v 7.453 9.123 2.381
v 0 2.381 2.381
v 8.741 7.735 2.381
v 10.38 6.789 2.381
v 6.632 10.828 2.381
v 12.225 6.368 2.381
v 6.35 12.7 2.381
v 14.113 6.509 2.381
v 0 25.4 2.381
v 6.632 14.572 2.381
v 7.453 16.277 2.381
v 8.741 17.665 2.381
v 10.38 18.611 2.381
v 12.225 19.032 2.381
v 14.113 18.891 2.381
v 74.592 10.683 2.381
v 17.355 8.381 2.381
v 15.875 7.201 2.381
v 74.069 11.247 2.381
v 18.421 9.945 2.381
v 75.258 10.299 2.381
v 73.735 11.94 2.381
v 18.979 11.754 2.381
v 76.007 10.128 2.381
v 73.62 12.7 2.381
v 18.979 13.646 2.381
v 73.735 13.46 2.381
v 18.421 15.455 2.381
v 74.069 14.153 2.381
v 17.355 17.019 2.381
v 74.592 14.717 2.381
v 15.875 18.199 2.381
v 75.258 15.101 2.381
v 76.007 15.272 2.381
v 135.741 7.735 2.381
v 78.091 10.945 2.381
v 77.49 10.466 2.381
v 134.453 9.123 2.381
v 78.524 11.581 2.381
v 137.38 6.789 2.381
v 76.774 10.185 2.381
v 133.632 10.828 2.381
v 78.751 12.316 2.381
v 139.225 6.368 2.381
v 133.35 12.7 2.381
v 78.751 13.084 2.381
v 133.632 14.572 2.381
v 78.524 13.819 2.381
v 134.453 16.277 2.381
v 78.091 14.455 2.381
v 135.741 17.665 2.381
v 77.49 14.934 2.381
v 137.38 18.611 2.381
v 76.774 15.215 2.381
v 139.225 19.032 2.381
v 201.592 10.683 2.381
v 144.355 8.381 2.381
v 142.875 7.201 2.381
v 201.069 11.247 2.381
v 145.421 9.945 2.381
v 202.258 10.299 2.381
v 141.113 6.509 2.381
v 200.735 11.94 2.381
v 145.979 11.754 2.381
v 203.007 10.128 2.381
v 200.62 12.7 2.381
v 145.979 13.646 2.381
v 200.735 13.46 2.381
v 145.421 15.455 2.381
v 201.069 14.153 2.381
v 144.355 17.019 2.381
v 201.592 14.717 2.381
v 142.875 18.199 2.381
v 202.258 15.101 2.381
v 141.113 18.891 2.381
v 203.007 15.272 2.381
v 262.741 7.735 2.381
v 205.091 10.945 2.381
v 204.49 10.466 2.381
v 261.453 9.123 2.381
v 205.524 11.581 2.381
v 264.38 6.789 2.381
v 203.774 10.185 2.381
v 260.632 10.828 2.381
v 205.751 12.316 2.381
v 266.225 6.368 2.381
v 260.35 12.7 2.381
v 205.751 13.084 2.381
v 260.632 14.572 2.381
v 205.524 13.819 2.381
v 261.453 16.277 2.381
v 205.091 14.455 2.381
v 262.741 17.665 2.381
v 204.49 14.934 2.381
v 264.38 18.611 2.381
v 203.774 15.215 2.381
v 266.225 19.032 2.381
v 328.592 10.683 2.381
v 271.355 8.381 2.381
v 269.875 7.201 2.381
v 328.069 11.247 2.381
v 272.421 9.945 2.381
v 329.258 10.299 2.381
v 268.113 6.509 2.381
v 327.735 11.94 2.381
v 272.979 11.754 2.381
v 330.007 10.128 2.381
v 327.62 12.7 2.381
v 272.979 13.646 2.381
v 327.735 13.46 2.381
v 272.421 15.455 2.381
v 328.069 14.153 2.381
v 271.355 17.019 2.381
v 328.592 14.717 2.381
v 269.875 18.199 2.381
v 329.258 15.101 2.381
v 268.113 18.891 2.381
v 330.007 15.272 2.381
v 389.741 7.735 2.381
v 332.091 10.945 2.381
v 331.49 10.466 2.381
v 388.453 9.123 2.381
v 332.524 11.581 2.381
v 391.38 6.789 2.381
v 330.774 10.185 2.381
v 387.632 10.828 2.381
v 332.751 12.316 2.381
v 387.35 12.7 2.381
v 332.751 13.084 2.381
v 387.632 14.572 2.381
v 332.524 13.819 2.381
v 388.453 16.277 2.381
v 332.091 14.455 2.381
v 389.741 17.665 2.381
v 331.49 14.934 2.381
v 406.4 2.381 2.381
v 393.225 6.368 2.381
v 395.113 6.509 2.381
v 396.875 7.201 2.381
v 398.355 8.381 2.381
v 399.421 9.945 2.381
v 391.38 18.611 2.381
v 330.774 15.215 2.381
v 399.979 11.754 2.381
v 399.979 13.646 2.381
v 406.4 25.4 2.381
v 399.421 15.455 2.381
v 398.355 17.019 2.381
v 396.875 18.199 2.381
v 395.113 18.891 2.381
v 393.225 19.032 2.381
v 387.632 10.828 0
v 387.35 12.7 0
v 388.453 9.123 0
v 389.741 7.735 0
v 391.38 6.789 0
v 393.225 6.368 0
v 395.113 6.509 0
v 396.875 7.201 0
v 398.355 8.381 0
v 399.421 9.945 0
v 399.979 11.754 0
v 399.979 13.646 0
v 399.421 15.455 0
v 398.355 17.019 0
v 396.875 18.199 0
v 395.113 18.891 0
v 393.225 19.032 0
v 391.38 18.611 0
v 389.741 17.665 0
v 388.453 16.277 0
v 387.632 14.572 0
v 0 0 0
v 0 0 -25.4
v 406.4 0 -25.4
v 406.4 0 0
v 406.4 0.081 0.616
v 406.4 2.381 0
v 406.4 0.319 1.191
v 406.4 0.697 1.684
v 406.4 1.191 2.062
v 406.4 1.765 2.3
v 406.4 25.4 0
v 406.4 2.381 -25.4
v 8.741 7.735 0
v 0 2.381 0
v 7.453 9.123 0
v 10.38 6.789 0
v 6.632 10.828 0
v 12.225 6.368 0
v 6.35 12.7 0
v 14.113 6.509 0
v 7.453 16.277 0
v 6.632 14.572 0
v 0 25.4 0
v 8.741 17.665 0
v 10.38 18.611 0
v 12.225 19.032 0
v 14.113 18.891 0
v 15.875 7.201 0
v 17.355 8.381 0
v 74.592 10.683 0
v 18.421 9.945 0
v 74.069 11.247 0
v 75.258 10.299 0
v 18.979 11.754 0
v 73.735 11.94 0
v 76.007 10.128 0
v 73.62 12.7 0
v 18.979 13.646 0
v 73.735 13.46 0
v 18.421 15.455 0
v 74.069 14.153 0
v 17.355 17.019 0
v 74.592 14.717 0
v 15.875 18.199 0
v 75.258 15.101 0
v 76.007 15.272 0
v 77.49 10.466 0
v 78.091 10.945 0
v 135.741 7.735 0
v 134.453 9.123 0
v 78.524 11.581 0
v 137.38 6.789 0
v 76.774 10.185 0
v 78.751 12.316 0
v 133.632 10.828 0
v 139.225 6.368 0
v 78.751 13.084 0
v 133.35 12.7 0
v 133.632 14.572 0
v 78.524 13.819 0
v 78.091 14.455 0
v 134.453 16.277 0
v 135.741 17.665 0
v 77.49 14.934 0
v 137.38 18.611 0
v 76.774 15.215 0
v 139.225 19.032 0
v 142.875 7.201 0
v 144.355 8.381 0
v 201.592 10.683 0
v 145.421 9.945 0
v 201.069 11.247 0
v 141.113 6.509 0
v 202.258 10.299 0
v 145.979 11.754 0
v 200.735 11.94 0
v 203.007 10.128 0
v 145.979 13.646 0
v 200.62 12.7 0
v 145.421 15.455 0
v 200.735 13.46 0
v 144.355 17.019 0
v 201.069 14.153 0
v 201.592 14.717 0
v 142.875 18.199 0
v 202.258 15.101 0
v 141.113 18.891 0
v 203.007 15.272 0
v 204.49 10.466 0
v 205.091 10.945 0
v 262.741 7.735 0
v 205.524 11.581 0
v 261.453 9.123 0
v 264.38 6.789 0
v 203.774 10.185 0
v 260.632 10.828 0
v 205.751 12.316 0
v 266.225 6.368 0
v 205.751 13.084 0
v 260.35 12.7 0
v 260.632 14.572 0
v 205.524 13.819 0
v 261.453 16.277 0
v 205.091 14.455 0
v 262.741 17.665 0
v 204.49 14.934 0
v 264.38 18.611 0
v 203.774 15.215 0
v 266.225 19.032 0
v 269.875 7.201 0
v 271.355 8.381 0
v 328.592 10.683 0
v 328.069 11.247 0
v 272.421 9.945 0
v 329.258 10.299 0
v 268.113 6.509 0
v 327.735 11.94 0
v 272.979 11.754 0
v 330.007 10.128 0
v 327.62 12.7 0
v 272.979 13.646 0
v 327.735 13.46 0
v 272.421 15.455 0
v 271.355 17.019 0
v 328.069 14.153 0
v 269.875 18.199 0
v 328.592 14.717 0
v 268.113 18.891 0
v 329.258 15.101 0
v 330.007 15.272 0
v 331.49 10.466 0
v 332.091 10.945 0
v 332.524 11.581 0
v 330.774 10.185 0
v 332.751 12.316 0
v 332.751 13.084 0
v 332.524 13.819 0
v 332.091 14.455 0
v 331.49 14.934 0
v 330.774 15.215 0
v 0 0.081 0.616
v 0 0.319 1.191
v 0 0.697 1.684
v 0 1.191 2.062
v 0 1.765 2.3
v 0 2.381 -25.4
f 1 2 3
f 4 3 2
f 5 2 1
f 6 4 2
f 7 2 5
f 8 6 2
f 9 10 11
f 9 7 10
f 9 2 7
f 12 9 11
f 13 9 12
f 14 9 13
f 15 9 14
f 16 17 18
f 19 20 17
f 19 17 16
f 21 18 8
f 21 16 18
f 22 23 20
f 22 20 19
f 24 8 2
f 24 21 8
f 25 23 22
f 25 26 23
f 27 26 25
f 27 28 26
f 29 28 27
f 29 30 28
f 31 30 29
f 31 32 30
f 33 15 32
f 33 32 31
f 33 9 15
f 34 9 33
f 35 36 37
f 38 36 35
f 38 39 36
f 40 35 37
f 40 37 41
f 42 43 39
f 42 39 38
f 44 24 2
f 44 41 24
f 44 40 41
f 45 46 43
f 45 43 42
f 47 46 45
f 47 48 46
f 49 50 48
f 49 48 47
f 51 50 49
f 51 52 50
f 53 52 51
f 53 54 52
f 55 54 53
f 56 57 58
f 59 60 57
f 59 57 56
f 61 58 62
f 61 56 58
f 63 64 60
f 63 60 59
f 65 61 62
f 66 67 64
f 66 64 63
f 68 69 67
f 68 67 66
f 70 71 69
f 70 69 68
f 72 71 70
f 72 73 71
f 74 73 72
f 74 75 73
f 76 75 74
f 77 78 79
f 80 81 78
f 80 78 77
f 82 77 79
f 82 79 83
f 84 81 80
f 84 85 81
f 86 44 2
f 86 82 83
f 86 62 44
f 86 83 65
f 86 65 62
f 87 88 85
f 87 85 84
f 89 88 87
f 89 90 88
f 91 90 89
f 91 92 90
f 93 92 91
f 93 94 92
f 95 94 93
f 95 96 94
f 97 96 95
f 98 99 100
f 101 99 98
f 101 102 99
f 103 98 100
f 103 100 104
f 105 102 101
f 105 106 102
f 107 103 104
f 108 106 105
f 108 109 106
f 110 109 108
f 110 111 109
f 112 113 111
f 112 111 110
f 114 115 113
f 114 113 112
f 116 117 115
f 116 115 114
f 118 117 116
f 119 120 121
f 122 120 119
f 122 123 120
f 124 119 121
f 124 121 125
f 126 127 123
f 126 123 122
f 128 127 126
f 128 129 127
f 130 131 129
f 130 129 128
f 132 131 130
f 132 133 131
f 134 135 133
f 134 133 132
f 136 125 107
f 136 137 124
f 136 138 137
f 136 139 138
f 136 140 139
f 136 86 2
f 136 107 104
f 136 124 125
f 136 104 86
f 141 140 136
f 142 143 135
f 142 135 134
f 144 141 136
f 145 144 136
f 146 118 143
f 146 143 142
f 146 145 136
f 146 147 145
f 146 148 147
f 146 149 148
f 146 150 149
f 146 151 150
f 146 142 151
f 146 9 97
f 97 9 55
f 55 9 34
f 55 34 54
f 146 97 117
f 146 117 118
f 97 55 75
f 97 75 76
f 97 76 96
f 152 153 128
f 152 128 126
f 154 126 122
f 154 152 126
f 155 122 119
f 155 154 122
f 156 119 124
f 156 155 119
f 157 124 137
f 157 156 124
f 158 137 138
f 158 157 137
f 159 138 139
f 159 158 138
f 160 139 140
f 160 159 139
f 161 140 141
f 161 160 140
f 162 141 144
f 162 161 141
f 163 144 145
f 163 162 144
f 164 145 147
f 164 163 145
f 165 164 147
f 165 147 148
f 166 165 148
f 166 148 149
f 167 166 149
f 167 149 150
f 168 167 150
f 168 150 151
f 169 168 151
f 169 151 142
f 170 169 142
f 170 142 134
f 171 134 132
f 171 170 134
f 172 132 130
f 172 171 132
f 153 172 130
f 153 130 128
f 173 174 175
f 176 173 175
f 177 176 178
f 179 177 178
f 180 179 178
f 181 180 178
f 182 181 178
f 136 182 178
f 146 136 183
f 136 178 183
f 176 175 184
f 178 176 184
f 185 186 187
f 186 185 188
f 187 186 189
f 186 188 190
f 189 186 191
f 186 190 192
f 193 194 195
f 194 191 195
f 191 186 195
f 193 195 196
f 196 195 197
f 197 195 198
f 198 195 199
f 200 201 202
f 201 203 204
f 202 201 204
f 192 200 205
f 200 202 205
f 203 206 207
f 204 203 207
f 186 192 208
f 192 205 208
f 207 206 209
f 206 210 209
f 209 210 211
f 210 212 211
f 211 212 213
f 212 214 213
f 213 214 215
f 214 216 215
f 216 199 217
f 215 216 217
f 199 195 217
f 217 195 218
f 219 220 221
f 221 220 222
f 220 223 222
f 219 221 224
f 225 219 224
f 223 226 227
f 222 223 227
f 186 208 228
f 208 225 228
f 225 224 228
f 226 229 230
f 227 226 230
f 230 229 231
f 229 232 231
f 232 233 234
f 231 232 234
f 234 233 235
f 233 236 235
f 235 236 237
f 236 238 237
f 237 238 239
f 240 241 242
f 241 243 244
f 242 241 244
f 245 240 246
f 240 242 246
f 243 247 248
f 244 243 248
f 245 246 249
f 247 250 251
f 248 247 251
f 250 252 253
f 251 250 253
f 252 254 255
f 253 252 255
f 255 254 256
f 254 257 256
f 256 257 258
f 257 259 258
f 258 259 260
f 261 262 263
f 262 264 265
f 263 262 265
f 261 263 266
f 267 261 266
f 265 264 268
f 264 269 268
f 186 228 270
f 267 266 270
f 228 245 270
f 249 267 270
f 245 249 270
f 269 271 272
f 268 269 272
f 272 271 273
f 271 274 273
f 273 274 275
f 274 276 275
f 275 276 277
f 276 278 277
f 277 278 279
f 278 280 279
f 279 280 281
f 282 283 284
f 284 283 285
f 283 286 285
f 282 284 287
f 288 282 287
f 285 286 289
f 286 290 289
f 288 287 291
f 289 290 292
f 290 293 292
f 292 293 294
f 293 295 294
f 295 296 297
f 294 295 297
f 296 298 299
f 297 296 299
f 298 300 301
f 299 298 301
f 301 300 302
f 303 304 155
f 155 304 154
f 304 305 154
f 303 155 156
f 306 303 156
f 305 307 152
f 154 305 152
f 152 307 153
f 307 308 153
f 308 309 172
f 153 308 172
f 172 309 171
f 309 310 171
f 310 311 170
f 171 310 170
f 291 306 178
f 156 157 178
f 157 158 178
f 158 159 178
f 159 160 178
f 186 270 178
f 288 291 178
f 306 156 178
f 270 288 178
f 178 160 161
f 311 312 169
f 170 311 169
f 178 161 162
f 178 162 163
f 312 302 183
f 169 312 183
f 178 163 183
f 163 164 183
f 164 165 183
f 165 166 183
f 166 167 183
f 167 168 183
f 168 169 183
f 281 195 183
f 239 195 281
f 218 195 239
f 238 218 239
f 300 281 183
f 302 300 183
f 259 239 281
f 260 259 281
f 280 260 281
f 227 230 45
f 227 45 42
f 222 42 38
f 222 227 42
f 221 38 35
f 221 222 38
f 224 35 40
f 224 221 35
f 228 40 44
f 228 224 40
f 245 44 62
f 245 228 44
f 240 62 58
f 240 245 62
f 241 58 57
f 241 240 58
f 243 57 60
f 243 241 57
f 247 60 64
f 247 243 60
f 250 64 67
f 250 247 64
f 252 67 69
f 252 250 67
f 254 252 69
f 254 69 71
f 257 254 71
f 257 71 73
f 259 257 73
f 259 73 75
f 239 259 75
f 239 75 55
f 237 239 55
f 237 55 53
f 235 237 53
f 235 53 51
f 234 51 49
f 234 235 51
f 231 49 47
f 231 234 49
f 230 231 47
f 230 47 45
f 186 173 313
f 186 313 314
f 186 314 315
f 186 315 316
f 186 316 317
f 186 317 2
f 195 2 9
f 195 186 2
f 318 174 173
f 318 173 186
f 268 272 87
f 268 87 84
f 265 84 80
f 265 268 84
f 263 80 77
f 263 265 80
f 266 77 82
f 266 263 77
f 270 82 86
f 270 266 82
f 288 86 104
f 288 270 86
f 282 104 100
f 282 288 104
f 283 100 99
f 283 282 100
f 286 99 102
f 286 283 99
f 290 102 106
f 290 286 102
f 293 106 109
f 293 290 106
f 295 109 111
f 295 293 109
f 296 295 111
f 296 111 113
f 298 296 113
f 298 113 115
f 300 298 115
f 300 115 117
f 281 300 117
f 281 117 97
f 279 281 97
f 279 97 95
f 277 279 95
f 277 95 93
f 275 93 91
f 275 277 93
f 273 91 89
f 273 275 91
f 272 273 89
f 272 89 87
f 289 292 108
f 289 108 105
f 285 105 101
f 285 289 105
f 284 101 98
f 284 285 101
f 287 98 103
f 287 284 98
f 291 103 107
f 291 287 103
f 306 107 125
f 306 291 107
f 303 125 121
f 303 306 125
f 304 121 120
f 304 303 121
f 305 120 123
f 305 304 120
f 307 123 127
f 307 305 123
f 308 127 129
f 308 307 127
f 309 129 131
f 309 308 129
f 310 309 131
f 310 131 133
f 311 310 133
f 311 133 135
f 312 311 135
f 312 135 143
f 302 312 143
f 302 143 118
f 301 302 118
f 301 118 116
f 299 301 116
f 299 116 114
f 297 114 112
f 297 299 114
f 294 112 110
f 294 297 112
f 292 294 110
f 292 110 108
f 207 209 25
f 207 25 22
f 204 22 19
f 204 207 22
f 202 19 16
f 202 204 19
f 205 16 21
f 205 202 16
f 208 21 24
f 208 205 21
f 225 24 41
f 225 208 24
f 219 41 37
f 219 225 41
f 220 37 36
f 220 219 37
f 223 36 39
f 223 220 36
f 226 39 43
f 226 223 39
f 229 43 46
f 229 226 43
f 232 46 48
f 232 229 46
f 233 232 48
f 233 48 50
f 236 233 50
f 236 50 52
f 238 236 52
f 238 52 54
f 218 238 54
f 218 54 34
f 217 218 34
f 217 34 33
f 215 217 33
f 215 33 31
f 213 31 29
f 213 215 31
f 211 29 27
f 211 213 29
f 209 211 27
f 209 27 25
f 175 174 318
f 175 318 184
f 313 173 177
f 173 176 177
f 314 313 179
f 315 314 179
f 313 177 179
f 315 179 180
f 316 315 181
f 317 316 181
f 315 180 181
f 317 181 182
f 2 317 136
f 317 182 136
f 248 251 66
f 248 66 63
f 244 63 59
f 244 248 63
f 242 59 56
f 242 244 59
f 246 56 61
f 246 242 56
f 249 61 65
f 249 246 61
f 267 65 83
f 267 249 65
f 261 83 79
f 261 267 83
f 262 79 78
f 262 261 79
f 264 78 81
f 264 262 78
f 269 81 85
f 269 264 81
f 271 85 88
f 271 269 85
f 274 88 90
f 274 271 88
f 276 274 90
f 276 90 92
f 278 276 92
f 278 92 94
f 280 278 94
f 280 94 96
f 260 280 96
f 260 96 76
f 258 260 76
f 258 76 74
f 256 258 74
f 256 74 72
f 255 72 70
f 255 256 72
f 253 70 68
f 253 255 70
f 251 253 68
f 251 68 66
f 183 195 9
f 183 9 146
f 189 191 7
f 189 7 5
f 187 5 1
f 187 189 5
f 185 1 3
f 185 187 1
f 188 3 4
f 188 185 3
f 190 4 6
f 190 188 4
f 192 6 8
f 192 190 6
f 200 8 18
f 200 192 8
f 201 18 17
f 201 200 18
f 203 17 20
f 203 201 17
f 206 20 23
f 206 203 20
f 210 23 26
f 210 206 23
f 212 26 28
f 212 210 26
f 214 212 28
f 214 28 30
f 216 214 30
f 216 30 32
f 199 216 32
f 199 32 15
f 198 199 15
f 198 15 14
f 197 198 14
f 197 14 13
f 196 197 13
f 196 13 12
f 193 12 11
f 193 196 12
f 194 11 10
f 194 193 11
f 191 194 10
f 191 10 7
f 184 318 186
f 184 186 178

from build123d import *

# Parameters (mm, degrees)
SKETCH1_W           = 406.4
SKETCH1_H           = 25.4
BOSS_EXTRUDE1_DEPTH = 2.38125
SKETCH2_W           = 406.4
SKETCH2_H           = 25.4
SKETCH2_R           = 6.35
SKETCH2_R_2         = 2.5796875
BOSS_EXTRUDE2_DEPTH = 2.38125
FILLET1_R           = 2.38125


with BuildPart() as part:
    # Sketch1 → Boss-Extrude1 (new body)
    with BuildSketch(Plane(origin=(0, 0, 0), x_dir=(1, 0, 0), z_dir=(0, 1, 0))):
        with Locations((203.2, 12.7)):
            Rectangle(SKETCH1_W, SKETCH1_H)
    extrude(amount=BOSS_EXTRUDE1_DEPTH)

    # Sketch2 → Boss-Extrude2 (add)
    with BuildSketch(Plane.XY):
        with Locations((203.2, 12.7)):
            Rectangle(SKETCH2_W, SKETCH2_H)
        with Locations(Location((12.7, 12.7, 0), (0, 0, 180))):
            Circle(SKETCH2_R, mode=Mode.SUBTRACT)
        with Locations(Location((139.7, 12.7, 0), (0, 0, 180))):
            Circle(SKETCH2_R, mode=Mode.SUBTRACT)
        with Locations(Location((266.7, 12.7, 0), (0, 0, 180))):
            Circle(SKETCH2_R, mode=Mode.SUBTRACT)
        with Locations(Location((393.7, 12.7, 0), (0, 0, 180))):
            Circle(SKETCH2_R, mode=Mode.SUBTRACT)
        with Locations(Location((76.2, 12.7, 0), (0, 0, 180))):
            Circle(SKETCH2_R_2, mode=Mode.SUBTRACT)
        with Locations(Location((203.2, 12.7, 0), (0, 0, 180))):
            Circle(SKETCH2_R_2, mode=Mode.SUBTRACT)
        with Locations(Location((330.2, 12.7, 0), (0, 0, 180))):
            Circle(SKETCH2_R_2, mode=Mode.SUBTRACT)
    extrude(amount=BOSS_EXTRUDE2_DEPTH)

    # Fillet1
    fillet1_edges = [part.edges().sort_by_distance(p)[0] for p in [
        (203.2, 0, 2.38125),
    ]]
    fillet(fillet1_edges, radius=FILLET1_R)


solid = part.part
